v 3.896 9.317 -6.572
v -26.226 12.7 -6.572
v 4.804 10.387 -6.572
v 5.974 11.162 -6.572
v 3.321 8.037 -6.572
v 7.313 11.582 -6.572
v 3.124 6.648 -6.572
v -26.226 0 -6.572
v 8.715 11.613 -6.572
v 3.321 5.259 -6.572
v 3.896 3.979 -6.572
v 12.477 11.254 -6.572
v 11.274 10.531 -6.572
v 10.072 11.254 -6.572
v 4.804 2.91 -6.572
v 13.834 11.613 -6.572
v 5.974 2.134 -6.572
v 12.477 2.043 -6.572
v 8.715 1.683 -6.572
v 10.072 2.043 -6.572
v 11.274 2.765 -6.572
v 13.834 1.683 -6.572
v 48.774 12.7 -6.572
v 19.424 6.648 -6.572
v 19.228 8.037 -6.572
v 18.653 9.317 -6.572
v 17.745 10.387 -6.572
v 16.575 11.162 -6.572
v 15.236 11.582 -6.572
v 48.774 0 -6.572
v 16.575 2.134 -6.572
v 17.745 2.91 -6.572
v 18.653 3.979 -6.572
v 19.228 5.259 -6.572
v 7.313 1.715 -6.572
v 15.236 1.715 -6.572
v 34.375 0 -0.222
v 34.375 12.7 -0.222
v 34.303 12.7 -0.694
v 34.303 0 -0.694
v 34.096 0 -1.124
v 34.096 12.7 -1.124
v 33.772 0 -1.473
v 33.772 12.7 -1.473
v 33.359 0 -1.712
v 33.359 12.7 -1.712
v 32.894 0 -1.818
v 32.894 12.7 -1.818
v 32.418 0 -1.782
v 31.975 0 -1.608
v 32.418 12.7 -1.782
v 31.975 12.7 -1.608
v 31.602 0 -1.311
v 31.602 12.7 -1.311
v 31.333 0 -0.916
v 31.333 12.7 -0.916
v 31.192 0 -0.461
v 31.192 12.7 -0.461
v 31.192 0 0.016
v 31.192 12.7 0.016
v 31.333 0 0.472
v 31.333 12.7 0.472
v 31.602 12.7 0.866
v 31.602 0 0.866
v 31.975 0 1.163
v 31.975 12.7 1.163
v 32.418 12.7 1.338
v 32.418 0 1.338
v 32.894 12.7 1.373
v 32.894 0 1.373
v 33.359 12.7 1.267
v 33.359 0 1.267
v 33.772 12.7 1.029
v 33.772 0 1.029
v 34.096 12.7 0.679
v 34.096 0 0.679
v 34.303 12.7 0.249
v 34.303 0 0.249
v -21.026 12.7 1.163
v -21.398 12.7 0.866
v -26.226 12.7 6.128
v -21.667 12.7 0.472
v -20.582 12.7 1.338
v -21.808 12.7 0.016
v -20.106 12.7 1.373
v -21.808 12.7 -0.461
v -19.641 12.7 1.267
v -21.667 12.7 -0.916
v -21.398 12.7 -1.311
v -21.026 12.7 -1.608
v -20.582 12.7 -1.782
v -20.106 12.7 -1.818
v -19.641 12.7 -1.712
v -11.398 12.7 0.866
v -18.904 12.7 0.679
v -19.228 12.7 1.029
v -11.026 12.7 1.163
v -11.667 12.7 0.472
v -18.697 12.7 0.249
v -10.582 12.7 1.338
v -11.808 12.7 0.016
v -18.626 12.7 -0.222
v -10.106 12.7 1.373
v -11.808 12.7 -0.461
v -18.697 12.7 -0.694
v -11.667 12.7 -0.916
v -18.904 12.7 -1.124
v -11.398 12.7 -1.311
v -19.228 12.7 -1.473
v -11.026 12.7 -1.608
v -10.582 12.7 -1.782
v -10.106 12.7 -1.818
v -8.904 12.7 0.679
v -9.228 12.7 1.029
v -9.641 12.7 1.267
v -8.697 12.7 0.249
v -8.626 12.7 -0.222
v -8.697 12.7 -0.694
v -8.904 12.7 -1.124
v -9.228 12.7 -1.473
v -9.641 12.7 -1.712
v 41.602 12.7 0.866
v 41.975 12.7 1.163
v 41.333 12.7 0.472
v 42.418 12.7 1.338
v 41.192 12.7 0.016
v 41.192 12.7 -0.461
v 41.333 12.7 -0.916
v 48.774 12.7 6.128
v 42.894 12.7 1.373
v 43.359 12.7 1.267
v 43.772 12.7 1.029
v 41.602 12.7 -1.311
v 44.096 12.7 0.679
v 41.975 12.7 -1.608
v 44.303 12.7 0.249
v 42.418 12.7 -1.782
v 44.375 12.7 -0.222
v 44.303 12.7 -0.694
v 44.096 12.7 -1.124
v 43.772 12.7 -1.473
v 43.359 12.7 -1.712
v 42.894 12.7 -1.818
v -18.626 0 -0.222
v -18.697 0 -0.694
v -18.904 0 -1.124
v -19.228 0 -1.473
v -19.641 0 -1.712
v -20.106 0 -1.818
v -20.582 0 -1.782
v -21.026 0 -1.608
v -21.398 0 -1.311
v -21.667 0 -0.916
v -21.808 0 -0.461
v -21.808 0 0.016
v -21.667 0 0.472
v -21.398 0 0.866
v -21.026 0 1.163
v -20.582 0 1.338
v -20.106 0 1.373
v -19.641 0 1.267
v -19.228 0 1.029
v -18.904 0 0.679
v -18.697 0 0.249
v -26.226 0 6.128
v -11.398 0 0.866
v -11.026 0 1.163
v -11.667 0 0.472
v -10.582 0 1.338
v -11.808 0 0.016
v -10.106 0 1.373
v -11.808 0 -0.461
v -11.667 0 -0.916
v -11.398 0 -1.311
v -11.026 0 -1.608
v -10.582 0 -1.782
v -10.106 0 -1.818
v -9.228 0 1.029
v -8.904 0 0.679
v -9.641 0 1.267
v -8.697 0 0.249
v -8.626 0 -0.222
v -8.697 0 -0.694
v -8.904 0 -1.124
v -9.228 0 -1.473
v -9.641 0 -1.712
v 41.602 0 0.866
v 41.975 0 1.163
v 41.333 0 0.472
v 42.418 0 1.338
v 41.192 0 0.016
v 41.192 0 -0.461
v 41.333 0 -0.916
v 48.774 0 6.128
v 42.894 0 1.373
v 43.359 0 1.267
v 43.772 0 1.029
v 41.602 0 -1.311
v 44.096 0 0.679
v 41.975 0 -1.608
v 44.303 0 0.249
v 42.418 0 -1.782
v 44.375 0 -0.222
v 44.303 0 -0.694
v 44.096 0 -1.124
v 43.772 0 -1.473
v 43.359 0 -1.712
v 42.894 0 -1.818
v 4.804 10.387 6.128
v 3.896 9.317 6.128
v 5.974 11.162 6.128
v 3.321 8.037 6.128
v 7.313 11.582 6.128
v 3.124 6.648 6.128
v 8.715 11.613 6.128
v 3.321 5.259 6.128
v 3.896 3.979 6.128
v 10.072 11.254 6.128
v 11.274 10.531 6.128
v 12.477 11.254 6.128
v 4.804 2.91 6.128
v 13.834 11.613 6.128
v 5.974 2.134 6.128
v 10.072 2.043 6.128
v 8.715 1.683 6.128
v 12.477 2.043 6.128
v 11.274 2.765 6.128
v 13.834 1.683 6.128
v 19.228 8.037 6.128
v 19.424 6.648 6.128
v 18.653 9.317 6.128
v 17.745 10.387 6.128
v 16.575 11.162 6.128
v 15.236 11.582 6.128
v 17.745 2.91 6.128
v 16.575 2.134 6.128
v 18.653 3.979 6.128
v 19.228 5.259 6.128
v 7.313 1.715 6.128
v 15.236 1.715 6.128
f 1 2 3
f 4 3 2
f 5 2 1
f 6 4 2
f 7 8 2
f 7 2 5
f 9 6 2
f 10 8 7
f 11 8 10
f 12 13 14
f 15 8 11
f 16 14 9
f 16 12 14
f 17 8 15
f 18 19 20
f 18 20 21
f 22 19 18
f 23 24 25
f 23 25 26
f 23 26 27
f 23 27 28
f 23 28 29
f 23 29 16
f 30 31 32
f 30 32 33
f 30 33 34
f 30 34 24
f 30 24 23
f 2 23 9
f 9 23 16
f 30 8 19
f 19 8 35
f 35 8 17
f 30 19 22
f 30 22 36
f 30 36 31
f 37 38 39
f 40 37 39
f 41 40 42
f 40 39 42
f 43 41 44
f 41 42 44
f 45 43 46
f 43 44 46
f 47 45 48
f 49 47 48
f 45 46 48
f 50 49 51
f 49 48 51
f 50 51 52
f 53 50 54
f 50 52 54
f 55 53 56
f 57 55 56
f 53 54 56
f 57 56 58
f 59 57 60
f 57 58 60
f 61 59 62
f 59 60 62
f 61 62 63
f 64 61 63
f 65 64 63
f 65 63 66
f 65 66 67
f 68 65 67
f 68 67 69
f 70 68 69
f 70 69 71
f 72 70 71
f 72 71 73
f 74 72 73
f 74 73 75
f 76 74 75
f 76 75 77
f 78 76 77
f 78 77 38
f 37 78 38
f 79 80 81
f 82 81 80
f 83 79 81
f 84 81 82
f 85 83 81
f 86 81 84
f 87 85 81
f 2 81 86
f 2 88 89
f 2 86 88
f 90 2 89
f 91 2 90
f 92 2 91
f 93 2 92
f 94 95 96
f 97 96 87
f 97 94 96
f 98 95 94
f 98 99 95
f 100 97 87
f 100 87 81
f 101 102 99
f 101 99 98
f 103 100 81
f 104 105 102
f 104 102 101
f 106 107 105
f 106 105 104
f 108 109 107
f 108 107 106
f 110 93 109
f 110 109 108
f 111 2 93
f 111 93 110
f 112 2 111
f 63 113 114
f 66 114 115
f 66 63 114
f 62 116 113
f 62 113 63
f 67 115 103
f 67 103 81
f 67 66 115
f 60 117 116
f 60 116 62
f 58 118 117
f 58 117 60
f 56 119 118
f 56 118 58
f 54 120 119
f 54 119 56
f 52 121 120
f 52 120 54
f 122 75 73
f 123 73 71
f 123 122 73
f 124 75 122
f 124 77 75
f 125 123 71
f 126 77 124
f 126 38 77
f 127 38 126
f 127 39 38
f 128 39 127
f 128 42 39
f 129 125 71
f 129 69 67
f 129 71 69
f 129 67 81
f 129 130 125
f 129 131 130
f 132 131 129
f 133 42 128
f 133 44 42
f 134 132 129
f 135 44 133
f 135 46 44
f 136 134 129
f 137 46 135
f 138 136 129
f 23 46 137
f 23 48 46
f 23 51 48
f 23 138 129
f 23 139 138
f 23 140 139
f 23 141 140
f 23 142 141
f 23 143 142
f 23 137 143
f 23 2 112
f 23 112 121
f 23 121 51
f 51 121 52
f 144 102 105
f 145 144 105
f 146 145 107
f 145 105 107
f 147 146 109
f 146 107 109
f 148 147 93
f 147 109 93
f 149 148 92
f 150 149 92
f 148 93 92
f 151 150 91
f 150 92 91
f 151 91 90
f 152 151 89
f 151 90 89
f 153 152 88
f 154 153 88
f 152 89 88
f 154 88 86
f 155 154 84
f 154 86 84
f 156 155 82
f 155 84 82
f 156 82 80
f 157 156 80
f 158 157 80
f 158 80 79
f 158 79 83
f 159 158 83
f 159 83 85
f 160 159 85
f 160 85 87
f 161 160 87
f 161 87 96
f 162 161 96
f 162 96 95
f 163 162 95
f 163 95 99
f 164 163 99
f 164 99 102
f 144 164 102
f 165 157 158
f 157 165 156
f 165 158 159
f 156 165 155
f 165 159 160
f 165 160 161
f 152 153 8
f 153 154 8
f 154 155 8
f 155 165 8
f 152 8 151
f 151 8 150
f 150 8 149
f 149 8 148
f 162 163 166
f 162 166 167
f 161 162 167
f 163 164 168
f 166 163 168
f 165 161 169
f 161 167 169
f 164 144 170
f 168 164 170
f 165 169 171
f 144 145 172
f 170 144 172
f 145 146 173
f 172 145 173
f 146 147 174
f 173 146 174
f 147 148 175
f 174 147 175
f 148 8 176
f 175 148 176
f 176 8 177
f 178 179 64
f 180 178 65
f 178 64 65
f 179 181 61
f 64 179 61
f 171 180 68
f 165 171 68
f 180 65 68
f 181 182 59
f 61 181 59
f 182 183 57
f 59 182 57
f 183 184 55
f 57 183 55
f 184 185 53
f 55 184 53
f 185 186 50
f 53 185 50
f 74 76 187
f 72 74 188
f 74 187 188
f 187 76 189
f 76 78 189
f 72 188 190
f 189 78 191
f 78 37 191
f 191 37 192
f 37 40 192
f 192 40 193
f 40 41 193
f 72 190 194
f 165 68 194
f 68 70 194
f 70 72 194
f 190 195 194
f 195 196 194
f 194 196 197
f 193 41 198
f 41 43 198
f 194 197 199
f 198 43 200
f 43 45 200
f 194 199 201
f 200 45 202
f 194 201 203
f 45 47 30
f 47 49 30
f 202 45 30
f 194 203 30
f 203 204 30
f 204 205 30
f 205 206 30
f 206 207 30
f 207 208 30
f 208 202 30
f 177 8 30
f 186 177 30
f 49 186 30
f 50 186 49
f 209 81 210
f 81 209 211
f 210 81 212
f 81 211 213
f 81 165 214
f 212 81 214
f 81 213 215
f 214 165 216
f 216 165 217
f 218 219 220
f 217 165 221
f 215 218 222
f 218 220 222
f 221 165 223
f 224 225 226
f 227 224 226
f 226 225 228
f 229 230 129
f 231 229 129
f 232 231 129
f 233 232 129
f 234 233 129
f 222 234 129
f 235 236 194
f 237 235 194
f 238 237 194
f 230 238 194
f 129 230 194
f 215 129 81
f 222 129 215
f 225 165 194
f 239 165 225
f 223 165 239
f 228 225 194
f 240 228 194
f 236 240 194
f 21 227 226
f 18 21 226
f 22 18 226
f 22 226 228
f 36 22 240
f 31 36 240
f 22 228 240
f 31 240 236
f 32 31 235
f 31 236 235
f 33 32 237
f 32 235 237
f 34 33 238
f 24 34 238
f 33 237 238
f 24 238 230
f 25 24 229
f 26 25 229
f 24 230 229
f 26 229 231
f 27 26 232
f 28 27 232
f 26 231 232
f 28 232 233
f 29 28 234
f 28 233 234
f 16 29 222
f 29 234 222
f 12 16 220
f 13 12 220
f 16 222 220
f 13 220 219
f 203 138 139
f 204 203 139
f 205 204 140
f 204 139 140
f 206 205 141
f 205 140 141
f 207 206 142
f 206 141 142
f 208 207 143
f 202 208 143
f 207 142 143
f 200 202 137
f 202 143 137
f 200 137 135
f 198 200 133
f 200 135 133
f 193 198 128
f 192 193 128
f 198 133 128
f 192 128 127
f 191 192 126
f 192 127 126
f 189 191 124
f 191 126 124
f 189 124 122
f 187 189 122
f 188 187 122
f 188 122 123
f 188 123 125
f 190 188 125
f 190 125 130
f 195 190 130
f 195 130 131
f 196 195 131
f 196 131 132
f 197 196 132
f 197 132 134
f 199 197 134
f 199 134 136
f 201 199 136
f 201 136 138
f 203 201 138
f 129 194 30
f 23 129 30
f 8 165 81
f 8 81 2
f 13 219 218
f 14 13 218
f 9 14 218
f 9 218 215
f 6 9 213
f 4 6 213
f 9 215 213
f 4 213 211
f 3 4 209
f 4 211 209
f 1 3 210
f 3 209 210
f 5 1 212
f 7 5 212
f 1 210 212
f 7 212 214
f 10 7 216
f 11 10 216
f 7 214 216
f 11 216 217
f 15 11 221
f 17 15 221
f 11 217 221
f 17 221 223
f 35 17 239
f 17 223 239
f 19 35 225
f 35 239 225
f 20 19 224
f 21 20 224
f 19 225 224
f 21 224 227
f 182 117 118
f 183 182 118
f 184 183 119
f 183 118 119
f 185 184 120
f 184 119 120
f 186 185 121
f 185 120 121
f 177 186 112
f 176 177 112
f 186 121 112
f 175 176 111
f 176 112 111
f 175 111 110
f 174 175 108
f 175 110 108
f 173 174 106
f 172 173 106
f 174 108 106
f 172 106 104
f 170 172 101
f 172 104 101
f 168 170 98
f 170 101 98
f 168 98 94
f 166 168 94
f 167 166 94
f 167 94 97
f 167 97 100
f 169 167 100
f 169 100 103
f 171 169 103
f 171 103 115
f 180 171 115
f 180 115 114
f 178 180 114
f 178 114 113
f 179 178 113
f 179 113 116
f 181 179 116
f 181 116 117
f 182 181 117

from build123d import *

# Parameters (mm, degrees)
SKETCH2_W           = 75
SKETCH2_H           = 12.7
BOSS_EXTRUDE1_DEPTH = 12.7
CUT_EXTRUDE1_DEPTH  = 12.7
SKETCH4_R           = 1.6
CUT_EXTRUDE2_DEPTH  = 13.7


with BuildPart() as part:
    # Sketch2 → Boss-Extrude1 (new body)
    with BuildSketch(Plane(origin=(0, 0, 0), x_dir=(1, 0, 0), z_dir=(0, 1, 0))):
        with Locations((11.2745, 0.22225)):
            Rectangle(SKETCH2_W, SKETCH2_H)
    extrude(amount=BOSS_EXTRUDE1_DEPTH)

    # Sketch3 → Cut-Extrude1 (cut)
    with BuildSketch(Plane.XY.offset(6.12775)):
        with BuildLine():
            ThreePointArc((11.2745, 10.531229249), (3.1245, 6.648253585), (11.2745, 2.765277922))
            ThreePointArc((11.2745, 2.765277922), (19.4245, 6.648253585), (11.2745, 10.531229249))
        make_face()
    extrude(amount=-CUT_EXTRUDE1_DEPTH, mode=Mode.SUBTRACT)

    # Sketch4 → Cut-Extrude2 (cut, through all)
    with BuildSketch(Plane(origin=(0, 12.7, 0), x_dir=(1, 0, 0), z_dir=(0, 1, 0))):
        with Locations((-20.2255, 0.22225)):
            Circle(SKETCH4_R)
        with Locations((-10.2255, 0.22225)):
            Circle(SKETCH4_R)
        with Locations((32.7745, 0.22225)):
            Circle(SKETCH4_R)
        with Locations((42.7745, 0.22225)):
            Circle(SKETCH4_R)
    extrude(amount=-CUT_EXTRUDE2_DEPTH, mode=Mode.SUBTRACT)


solid = part.part
